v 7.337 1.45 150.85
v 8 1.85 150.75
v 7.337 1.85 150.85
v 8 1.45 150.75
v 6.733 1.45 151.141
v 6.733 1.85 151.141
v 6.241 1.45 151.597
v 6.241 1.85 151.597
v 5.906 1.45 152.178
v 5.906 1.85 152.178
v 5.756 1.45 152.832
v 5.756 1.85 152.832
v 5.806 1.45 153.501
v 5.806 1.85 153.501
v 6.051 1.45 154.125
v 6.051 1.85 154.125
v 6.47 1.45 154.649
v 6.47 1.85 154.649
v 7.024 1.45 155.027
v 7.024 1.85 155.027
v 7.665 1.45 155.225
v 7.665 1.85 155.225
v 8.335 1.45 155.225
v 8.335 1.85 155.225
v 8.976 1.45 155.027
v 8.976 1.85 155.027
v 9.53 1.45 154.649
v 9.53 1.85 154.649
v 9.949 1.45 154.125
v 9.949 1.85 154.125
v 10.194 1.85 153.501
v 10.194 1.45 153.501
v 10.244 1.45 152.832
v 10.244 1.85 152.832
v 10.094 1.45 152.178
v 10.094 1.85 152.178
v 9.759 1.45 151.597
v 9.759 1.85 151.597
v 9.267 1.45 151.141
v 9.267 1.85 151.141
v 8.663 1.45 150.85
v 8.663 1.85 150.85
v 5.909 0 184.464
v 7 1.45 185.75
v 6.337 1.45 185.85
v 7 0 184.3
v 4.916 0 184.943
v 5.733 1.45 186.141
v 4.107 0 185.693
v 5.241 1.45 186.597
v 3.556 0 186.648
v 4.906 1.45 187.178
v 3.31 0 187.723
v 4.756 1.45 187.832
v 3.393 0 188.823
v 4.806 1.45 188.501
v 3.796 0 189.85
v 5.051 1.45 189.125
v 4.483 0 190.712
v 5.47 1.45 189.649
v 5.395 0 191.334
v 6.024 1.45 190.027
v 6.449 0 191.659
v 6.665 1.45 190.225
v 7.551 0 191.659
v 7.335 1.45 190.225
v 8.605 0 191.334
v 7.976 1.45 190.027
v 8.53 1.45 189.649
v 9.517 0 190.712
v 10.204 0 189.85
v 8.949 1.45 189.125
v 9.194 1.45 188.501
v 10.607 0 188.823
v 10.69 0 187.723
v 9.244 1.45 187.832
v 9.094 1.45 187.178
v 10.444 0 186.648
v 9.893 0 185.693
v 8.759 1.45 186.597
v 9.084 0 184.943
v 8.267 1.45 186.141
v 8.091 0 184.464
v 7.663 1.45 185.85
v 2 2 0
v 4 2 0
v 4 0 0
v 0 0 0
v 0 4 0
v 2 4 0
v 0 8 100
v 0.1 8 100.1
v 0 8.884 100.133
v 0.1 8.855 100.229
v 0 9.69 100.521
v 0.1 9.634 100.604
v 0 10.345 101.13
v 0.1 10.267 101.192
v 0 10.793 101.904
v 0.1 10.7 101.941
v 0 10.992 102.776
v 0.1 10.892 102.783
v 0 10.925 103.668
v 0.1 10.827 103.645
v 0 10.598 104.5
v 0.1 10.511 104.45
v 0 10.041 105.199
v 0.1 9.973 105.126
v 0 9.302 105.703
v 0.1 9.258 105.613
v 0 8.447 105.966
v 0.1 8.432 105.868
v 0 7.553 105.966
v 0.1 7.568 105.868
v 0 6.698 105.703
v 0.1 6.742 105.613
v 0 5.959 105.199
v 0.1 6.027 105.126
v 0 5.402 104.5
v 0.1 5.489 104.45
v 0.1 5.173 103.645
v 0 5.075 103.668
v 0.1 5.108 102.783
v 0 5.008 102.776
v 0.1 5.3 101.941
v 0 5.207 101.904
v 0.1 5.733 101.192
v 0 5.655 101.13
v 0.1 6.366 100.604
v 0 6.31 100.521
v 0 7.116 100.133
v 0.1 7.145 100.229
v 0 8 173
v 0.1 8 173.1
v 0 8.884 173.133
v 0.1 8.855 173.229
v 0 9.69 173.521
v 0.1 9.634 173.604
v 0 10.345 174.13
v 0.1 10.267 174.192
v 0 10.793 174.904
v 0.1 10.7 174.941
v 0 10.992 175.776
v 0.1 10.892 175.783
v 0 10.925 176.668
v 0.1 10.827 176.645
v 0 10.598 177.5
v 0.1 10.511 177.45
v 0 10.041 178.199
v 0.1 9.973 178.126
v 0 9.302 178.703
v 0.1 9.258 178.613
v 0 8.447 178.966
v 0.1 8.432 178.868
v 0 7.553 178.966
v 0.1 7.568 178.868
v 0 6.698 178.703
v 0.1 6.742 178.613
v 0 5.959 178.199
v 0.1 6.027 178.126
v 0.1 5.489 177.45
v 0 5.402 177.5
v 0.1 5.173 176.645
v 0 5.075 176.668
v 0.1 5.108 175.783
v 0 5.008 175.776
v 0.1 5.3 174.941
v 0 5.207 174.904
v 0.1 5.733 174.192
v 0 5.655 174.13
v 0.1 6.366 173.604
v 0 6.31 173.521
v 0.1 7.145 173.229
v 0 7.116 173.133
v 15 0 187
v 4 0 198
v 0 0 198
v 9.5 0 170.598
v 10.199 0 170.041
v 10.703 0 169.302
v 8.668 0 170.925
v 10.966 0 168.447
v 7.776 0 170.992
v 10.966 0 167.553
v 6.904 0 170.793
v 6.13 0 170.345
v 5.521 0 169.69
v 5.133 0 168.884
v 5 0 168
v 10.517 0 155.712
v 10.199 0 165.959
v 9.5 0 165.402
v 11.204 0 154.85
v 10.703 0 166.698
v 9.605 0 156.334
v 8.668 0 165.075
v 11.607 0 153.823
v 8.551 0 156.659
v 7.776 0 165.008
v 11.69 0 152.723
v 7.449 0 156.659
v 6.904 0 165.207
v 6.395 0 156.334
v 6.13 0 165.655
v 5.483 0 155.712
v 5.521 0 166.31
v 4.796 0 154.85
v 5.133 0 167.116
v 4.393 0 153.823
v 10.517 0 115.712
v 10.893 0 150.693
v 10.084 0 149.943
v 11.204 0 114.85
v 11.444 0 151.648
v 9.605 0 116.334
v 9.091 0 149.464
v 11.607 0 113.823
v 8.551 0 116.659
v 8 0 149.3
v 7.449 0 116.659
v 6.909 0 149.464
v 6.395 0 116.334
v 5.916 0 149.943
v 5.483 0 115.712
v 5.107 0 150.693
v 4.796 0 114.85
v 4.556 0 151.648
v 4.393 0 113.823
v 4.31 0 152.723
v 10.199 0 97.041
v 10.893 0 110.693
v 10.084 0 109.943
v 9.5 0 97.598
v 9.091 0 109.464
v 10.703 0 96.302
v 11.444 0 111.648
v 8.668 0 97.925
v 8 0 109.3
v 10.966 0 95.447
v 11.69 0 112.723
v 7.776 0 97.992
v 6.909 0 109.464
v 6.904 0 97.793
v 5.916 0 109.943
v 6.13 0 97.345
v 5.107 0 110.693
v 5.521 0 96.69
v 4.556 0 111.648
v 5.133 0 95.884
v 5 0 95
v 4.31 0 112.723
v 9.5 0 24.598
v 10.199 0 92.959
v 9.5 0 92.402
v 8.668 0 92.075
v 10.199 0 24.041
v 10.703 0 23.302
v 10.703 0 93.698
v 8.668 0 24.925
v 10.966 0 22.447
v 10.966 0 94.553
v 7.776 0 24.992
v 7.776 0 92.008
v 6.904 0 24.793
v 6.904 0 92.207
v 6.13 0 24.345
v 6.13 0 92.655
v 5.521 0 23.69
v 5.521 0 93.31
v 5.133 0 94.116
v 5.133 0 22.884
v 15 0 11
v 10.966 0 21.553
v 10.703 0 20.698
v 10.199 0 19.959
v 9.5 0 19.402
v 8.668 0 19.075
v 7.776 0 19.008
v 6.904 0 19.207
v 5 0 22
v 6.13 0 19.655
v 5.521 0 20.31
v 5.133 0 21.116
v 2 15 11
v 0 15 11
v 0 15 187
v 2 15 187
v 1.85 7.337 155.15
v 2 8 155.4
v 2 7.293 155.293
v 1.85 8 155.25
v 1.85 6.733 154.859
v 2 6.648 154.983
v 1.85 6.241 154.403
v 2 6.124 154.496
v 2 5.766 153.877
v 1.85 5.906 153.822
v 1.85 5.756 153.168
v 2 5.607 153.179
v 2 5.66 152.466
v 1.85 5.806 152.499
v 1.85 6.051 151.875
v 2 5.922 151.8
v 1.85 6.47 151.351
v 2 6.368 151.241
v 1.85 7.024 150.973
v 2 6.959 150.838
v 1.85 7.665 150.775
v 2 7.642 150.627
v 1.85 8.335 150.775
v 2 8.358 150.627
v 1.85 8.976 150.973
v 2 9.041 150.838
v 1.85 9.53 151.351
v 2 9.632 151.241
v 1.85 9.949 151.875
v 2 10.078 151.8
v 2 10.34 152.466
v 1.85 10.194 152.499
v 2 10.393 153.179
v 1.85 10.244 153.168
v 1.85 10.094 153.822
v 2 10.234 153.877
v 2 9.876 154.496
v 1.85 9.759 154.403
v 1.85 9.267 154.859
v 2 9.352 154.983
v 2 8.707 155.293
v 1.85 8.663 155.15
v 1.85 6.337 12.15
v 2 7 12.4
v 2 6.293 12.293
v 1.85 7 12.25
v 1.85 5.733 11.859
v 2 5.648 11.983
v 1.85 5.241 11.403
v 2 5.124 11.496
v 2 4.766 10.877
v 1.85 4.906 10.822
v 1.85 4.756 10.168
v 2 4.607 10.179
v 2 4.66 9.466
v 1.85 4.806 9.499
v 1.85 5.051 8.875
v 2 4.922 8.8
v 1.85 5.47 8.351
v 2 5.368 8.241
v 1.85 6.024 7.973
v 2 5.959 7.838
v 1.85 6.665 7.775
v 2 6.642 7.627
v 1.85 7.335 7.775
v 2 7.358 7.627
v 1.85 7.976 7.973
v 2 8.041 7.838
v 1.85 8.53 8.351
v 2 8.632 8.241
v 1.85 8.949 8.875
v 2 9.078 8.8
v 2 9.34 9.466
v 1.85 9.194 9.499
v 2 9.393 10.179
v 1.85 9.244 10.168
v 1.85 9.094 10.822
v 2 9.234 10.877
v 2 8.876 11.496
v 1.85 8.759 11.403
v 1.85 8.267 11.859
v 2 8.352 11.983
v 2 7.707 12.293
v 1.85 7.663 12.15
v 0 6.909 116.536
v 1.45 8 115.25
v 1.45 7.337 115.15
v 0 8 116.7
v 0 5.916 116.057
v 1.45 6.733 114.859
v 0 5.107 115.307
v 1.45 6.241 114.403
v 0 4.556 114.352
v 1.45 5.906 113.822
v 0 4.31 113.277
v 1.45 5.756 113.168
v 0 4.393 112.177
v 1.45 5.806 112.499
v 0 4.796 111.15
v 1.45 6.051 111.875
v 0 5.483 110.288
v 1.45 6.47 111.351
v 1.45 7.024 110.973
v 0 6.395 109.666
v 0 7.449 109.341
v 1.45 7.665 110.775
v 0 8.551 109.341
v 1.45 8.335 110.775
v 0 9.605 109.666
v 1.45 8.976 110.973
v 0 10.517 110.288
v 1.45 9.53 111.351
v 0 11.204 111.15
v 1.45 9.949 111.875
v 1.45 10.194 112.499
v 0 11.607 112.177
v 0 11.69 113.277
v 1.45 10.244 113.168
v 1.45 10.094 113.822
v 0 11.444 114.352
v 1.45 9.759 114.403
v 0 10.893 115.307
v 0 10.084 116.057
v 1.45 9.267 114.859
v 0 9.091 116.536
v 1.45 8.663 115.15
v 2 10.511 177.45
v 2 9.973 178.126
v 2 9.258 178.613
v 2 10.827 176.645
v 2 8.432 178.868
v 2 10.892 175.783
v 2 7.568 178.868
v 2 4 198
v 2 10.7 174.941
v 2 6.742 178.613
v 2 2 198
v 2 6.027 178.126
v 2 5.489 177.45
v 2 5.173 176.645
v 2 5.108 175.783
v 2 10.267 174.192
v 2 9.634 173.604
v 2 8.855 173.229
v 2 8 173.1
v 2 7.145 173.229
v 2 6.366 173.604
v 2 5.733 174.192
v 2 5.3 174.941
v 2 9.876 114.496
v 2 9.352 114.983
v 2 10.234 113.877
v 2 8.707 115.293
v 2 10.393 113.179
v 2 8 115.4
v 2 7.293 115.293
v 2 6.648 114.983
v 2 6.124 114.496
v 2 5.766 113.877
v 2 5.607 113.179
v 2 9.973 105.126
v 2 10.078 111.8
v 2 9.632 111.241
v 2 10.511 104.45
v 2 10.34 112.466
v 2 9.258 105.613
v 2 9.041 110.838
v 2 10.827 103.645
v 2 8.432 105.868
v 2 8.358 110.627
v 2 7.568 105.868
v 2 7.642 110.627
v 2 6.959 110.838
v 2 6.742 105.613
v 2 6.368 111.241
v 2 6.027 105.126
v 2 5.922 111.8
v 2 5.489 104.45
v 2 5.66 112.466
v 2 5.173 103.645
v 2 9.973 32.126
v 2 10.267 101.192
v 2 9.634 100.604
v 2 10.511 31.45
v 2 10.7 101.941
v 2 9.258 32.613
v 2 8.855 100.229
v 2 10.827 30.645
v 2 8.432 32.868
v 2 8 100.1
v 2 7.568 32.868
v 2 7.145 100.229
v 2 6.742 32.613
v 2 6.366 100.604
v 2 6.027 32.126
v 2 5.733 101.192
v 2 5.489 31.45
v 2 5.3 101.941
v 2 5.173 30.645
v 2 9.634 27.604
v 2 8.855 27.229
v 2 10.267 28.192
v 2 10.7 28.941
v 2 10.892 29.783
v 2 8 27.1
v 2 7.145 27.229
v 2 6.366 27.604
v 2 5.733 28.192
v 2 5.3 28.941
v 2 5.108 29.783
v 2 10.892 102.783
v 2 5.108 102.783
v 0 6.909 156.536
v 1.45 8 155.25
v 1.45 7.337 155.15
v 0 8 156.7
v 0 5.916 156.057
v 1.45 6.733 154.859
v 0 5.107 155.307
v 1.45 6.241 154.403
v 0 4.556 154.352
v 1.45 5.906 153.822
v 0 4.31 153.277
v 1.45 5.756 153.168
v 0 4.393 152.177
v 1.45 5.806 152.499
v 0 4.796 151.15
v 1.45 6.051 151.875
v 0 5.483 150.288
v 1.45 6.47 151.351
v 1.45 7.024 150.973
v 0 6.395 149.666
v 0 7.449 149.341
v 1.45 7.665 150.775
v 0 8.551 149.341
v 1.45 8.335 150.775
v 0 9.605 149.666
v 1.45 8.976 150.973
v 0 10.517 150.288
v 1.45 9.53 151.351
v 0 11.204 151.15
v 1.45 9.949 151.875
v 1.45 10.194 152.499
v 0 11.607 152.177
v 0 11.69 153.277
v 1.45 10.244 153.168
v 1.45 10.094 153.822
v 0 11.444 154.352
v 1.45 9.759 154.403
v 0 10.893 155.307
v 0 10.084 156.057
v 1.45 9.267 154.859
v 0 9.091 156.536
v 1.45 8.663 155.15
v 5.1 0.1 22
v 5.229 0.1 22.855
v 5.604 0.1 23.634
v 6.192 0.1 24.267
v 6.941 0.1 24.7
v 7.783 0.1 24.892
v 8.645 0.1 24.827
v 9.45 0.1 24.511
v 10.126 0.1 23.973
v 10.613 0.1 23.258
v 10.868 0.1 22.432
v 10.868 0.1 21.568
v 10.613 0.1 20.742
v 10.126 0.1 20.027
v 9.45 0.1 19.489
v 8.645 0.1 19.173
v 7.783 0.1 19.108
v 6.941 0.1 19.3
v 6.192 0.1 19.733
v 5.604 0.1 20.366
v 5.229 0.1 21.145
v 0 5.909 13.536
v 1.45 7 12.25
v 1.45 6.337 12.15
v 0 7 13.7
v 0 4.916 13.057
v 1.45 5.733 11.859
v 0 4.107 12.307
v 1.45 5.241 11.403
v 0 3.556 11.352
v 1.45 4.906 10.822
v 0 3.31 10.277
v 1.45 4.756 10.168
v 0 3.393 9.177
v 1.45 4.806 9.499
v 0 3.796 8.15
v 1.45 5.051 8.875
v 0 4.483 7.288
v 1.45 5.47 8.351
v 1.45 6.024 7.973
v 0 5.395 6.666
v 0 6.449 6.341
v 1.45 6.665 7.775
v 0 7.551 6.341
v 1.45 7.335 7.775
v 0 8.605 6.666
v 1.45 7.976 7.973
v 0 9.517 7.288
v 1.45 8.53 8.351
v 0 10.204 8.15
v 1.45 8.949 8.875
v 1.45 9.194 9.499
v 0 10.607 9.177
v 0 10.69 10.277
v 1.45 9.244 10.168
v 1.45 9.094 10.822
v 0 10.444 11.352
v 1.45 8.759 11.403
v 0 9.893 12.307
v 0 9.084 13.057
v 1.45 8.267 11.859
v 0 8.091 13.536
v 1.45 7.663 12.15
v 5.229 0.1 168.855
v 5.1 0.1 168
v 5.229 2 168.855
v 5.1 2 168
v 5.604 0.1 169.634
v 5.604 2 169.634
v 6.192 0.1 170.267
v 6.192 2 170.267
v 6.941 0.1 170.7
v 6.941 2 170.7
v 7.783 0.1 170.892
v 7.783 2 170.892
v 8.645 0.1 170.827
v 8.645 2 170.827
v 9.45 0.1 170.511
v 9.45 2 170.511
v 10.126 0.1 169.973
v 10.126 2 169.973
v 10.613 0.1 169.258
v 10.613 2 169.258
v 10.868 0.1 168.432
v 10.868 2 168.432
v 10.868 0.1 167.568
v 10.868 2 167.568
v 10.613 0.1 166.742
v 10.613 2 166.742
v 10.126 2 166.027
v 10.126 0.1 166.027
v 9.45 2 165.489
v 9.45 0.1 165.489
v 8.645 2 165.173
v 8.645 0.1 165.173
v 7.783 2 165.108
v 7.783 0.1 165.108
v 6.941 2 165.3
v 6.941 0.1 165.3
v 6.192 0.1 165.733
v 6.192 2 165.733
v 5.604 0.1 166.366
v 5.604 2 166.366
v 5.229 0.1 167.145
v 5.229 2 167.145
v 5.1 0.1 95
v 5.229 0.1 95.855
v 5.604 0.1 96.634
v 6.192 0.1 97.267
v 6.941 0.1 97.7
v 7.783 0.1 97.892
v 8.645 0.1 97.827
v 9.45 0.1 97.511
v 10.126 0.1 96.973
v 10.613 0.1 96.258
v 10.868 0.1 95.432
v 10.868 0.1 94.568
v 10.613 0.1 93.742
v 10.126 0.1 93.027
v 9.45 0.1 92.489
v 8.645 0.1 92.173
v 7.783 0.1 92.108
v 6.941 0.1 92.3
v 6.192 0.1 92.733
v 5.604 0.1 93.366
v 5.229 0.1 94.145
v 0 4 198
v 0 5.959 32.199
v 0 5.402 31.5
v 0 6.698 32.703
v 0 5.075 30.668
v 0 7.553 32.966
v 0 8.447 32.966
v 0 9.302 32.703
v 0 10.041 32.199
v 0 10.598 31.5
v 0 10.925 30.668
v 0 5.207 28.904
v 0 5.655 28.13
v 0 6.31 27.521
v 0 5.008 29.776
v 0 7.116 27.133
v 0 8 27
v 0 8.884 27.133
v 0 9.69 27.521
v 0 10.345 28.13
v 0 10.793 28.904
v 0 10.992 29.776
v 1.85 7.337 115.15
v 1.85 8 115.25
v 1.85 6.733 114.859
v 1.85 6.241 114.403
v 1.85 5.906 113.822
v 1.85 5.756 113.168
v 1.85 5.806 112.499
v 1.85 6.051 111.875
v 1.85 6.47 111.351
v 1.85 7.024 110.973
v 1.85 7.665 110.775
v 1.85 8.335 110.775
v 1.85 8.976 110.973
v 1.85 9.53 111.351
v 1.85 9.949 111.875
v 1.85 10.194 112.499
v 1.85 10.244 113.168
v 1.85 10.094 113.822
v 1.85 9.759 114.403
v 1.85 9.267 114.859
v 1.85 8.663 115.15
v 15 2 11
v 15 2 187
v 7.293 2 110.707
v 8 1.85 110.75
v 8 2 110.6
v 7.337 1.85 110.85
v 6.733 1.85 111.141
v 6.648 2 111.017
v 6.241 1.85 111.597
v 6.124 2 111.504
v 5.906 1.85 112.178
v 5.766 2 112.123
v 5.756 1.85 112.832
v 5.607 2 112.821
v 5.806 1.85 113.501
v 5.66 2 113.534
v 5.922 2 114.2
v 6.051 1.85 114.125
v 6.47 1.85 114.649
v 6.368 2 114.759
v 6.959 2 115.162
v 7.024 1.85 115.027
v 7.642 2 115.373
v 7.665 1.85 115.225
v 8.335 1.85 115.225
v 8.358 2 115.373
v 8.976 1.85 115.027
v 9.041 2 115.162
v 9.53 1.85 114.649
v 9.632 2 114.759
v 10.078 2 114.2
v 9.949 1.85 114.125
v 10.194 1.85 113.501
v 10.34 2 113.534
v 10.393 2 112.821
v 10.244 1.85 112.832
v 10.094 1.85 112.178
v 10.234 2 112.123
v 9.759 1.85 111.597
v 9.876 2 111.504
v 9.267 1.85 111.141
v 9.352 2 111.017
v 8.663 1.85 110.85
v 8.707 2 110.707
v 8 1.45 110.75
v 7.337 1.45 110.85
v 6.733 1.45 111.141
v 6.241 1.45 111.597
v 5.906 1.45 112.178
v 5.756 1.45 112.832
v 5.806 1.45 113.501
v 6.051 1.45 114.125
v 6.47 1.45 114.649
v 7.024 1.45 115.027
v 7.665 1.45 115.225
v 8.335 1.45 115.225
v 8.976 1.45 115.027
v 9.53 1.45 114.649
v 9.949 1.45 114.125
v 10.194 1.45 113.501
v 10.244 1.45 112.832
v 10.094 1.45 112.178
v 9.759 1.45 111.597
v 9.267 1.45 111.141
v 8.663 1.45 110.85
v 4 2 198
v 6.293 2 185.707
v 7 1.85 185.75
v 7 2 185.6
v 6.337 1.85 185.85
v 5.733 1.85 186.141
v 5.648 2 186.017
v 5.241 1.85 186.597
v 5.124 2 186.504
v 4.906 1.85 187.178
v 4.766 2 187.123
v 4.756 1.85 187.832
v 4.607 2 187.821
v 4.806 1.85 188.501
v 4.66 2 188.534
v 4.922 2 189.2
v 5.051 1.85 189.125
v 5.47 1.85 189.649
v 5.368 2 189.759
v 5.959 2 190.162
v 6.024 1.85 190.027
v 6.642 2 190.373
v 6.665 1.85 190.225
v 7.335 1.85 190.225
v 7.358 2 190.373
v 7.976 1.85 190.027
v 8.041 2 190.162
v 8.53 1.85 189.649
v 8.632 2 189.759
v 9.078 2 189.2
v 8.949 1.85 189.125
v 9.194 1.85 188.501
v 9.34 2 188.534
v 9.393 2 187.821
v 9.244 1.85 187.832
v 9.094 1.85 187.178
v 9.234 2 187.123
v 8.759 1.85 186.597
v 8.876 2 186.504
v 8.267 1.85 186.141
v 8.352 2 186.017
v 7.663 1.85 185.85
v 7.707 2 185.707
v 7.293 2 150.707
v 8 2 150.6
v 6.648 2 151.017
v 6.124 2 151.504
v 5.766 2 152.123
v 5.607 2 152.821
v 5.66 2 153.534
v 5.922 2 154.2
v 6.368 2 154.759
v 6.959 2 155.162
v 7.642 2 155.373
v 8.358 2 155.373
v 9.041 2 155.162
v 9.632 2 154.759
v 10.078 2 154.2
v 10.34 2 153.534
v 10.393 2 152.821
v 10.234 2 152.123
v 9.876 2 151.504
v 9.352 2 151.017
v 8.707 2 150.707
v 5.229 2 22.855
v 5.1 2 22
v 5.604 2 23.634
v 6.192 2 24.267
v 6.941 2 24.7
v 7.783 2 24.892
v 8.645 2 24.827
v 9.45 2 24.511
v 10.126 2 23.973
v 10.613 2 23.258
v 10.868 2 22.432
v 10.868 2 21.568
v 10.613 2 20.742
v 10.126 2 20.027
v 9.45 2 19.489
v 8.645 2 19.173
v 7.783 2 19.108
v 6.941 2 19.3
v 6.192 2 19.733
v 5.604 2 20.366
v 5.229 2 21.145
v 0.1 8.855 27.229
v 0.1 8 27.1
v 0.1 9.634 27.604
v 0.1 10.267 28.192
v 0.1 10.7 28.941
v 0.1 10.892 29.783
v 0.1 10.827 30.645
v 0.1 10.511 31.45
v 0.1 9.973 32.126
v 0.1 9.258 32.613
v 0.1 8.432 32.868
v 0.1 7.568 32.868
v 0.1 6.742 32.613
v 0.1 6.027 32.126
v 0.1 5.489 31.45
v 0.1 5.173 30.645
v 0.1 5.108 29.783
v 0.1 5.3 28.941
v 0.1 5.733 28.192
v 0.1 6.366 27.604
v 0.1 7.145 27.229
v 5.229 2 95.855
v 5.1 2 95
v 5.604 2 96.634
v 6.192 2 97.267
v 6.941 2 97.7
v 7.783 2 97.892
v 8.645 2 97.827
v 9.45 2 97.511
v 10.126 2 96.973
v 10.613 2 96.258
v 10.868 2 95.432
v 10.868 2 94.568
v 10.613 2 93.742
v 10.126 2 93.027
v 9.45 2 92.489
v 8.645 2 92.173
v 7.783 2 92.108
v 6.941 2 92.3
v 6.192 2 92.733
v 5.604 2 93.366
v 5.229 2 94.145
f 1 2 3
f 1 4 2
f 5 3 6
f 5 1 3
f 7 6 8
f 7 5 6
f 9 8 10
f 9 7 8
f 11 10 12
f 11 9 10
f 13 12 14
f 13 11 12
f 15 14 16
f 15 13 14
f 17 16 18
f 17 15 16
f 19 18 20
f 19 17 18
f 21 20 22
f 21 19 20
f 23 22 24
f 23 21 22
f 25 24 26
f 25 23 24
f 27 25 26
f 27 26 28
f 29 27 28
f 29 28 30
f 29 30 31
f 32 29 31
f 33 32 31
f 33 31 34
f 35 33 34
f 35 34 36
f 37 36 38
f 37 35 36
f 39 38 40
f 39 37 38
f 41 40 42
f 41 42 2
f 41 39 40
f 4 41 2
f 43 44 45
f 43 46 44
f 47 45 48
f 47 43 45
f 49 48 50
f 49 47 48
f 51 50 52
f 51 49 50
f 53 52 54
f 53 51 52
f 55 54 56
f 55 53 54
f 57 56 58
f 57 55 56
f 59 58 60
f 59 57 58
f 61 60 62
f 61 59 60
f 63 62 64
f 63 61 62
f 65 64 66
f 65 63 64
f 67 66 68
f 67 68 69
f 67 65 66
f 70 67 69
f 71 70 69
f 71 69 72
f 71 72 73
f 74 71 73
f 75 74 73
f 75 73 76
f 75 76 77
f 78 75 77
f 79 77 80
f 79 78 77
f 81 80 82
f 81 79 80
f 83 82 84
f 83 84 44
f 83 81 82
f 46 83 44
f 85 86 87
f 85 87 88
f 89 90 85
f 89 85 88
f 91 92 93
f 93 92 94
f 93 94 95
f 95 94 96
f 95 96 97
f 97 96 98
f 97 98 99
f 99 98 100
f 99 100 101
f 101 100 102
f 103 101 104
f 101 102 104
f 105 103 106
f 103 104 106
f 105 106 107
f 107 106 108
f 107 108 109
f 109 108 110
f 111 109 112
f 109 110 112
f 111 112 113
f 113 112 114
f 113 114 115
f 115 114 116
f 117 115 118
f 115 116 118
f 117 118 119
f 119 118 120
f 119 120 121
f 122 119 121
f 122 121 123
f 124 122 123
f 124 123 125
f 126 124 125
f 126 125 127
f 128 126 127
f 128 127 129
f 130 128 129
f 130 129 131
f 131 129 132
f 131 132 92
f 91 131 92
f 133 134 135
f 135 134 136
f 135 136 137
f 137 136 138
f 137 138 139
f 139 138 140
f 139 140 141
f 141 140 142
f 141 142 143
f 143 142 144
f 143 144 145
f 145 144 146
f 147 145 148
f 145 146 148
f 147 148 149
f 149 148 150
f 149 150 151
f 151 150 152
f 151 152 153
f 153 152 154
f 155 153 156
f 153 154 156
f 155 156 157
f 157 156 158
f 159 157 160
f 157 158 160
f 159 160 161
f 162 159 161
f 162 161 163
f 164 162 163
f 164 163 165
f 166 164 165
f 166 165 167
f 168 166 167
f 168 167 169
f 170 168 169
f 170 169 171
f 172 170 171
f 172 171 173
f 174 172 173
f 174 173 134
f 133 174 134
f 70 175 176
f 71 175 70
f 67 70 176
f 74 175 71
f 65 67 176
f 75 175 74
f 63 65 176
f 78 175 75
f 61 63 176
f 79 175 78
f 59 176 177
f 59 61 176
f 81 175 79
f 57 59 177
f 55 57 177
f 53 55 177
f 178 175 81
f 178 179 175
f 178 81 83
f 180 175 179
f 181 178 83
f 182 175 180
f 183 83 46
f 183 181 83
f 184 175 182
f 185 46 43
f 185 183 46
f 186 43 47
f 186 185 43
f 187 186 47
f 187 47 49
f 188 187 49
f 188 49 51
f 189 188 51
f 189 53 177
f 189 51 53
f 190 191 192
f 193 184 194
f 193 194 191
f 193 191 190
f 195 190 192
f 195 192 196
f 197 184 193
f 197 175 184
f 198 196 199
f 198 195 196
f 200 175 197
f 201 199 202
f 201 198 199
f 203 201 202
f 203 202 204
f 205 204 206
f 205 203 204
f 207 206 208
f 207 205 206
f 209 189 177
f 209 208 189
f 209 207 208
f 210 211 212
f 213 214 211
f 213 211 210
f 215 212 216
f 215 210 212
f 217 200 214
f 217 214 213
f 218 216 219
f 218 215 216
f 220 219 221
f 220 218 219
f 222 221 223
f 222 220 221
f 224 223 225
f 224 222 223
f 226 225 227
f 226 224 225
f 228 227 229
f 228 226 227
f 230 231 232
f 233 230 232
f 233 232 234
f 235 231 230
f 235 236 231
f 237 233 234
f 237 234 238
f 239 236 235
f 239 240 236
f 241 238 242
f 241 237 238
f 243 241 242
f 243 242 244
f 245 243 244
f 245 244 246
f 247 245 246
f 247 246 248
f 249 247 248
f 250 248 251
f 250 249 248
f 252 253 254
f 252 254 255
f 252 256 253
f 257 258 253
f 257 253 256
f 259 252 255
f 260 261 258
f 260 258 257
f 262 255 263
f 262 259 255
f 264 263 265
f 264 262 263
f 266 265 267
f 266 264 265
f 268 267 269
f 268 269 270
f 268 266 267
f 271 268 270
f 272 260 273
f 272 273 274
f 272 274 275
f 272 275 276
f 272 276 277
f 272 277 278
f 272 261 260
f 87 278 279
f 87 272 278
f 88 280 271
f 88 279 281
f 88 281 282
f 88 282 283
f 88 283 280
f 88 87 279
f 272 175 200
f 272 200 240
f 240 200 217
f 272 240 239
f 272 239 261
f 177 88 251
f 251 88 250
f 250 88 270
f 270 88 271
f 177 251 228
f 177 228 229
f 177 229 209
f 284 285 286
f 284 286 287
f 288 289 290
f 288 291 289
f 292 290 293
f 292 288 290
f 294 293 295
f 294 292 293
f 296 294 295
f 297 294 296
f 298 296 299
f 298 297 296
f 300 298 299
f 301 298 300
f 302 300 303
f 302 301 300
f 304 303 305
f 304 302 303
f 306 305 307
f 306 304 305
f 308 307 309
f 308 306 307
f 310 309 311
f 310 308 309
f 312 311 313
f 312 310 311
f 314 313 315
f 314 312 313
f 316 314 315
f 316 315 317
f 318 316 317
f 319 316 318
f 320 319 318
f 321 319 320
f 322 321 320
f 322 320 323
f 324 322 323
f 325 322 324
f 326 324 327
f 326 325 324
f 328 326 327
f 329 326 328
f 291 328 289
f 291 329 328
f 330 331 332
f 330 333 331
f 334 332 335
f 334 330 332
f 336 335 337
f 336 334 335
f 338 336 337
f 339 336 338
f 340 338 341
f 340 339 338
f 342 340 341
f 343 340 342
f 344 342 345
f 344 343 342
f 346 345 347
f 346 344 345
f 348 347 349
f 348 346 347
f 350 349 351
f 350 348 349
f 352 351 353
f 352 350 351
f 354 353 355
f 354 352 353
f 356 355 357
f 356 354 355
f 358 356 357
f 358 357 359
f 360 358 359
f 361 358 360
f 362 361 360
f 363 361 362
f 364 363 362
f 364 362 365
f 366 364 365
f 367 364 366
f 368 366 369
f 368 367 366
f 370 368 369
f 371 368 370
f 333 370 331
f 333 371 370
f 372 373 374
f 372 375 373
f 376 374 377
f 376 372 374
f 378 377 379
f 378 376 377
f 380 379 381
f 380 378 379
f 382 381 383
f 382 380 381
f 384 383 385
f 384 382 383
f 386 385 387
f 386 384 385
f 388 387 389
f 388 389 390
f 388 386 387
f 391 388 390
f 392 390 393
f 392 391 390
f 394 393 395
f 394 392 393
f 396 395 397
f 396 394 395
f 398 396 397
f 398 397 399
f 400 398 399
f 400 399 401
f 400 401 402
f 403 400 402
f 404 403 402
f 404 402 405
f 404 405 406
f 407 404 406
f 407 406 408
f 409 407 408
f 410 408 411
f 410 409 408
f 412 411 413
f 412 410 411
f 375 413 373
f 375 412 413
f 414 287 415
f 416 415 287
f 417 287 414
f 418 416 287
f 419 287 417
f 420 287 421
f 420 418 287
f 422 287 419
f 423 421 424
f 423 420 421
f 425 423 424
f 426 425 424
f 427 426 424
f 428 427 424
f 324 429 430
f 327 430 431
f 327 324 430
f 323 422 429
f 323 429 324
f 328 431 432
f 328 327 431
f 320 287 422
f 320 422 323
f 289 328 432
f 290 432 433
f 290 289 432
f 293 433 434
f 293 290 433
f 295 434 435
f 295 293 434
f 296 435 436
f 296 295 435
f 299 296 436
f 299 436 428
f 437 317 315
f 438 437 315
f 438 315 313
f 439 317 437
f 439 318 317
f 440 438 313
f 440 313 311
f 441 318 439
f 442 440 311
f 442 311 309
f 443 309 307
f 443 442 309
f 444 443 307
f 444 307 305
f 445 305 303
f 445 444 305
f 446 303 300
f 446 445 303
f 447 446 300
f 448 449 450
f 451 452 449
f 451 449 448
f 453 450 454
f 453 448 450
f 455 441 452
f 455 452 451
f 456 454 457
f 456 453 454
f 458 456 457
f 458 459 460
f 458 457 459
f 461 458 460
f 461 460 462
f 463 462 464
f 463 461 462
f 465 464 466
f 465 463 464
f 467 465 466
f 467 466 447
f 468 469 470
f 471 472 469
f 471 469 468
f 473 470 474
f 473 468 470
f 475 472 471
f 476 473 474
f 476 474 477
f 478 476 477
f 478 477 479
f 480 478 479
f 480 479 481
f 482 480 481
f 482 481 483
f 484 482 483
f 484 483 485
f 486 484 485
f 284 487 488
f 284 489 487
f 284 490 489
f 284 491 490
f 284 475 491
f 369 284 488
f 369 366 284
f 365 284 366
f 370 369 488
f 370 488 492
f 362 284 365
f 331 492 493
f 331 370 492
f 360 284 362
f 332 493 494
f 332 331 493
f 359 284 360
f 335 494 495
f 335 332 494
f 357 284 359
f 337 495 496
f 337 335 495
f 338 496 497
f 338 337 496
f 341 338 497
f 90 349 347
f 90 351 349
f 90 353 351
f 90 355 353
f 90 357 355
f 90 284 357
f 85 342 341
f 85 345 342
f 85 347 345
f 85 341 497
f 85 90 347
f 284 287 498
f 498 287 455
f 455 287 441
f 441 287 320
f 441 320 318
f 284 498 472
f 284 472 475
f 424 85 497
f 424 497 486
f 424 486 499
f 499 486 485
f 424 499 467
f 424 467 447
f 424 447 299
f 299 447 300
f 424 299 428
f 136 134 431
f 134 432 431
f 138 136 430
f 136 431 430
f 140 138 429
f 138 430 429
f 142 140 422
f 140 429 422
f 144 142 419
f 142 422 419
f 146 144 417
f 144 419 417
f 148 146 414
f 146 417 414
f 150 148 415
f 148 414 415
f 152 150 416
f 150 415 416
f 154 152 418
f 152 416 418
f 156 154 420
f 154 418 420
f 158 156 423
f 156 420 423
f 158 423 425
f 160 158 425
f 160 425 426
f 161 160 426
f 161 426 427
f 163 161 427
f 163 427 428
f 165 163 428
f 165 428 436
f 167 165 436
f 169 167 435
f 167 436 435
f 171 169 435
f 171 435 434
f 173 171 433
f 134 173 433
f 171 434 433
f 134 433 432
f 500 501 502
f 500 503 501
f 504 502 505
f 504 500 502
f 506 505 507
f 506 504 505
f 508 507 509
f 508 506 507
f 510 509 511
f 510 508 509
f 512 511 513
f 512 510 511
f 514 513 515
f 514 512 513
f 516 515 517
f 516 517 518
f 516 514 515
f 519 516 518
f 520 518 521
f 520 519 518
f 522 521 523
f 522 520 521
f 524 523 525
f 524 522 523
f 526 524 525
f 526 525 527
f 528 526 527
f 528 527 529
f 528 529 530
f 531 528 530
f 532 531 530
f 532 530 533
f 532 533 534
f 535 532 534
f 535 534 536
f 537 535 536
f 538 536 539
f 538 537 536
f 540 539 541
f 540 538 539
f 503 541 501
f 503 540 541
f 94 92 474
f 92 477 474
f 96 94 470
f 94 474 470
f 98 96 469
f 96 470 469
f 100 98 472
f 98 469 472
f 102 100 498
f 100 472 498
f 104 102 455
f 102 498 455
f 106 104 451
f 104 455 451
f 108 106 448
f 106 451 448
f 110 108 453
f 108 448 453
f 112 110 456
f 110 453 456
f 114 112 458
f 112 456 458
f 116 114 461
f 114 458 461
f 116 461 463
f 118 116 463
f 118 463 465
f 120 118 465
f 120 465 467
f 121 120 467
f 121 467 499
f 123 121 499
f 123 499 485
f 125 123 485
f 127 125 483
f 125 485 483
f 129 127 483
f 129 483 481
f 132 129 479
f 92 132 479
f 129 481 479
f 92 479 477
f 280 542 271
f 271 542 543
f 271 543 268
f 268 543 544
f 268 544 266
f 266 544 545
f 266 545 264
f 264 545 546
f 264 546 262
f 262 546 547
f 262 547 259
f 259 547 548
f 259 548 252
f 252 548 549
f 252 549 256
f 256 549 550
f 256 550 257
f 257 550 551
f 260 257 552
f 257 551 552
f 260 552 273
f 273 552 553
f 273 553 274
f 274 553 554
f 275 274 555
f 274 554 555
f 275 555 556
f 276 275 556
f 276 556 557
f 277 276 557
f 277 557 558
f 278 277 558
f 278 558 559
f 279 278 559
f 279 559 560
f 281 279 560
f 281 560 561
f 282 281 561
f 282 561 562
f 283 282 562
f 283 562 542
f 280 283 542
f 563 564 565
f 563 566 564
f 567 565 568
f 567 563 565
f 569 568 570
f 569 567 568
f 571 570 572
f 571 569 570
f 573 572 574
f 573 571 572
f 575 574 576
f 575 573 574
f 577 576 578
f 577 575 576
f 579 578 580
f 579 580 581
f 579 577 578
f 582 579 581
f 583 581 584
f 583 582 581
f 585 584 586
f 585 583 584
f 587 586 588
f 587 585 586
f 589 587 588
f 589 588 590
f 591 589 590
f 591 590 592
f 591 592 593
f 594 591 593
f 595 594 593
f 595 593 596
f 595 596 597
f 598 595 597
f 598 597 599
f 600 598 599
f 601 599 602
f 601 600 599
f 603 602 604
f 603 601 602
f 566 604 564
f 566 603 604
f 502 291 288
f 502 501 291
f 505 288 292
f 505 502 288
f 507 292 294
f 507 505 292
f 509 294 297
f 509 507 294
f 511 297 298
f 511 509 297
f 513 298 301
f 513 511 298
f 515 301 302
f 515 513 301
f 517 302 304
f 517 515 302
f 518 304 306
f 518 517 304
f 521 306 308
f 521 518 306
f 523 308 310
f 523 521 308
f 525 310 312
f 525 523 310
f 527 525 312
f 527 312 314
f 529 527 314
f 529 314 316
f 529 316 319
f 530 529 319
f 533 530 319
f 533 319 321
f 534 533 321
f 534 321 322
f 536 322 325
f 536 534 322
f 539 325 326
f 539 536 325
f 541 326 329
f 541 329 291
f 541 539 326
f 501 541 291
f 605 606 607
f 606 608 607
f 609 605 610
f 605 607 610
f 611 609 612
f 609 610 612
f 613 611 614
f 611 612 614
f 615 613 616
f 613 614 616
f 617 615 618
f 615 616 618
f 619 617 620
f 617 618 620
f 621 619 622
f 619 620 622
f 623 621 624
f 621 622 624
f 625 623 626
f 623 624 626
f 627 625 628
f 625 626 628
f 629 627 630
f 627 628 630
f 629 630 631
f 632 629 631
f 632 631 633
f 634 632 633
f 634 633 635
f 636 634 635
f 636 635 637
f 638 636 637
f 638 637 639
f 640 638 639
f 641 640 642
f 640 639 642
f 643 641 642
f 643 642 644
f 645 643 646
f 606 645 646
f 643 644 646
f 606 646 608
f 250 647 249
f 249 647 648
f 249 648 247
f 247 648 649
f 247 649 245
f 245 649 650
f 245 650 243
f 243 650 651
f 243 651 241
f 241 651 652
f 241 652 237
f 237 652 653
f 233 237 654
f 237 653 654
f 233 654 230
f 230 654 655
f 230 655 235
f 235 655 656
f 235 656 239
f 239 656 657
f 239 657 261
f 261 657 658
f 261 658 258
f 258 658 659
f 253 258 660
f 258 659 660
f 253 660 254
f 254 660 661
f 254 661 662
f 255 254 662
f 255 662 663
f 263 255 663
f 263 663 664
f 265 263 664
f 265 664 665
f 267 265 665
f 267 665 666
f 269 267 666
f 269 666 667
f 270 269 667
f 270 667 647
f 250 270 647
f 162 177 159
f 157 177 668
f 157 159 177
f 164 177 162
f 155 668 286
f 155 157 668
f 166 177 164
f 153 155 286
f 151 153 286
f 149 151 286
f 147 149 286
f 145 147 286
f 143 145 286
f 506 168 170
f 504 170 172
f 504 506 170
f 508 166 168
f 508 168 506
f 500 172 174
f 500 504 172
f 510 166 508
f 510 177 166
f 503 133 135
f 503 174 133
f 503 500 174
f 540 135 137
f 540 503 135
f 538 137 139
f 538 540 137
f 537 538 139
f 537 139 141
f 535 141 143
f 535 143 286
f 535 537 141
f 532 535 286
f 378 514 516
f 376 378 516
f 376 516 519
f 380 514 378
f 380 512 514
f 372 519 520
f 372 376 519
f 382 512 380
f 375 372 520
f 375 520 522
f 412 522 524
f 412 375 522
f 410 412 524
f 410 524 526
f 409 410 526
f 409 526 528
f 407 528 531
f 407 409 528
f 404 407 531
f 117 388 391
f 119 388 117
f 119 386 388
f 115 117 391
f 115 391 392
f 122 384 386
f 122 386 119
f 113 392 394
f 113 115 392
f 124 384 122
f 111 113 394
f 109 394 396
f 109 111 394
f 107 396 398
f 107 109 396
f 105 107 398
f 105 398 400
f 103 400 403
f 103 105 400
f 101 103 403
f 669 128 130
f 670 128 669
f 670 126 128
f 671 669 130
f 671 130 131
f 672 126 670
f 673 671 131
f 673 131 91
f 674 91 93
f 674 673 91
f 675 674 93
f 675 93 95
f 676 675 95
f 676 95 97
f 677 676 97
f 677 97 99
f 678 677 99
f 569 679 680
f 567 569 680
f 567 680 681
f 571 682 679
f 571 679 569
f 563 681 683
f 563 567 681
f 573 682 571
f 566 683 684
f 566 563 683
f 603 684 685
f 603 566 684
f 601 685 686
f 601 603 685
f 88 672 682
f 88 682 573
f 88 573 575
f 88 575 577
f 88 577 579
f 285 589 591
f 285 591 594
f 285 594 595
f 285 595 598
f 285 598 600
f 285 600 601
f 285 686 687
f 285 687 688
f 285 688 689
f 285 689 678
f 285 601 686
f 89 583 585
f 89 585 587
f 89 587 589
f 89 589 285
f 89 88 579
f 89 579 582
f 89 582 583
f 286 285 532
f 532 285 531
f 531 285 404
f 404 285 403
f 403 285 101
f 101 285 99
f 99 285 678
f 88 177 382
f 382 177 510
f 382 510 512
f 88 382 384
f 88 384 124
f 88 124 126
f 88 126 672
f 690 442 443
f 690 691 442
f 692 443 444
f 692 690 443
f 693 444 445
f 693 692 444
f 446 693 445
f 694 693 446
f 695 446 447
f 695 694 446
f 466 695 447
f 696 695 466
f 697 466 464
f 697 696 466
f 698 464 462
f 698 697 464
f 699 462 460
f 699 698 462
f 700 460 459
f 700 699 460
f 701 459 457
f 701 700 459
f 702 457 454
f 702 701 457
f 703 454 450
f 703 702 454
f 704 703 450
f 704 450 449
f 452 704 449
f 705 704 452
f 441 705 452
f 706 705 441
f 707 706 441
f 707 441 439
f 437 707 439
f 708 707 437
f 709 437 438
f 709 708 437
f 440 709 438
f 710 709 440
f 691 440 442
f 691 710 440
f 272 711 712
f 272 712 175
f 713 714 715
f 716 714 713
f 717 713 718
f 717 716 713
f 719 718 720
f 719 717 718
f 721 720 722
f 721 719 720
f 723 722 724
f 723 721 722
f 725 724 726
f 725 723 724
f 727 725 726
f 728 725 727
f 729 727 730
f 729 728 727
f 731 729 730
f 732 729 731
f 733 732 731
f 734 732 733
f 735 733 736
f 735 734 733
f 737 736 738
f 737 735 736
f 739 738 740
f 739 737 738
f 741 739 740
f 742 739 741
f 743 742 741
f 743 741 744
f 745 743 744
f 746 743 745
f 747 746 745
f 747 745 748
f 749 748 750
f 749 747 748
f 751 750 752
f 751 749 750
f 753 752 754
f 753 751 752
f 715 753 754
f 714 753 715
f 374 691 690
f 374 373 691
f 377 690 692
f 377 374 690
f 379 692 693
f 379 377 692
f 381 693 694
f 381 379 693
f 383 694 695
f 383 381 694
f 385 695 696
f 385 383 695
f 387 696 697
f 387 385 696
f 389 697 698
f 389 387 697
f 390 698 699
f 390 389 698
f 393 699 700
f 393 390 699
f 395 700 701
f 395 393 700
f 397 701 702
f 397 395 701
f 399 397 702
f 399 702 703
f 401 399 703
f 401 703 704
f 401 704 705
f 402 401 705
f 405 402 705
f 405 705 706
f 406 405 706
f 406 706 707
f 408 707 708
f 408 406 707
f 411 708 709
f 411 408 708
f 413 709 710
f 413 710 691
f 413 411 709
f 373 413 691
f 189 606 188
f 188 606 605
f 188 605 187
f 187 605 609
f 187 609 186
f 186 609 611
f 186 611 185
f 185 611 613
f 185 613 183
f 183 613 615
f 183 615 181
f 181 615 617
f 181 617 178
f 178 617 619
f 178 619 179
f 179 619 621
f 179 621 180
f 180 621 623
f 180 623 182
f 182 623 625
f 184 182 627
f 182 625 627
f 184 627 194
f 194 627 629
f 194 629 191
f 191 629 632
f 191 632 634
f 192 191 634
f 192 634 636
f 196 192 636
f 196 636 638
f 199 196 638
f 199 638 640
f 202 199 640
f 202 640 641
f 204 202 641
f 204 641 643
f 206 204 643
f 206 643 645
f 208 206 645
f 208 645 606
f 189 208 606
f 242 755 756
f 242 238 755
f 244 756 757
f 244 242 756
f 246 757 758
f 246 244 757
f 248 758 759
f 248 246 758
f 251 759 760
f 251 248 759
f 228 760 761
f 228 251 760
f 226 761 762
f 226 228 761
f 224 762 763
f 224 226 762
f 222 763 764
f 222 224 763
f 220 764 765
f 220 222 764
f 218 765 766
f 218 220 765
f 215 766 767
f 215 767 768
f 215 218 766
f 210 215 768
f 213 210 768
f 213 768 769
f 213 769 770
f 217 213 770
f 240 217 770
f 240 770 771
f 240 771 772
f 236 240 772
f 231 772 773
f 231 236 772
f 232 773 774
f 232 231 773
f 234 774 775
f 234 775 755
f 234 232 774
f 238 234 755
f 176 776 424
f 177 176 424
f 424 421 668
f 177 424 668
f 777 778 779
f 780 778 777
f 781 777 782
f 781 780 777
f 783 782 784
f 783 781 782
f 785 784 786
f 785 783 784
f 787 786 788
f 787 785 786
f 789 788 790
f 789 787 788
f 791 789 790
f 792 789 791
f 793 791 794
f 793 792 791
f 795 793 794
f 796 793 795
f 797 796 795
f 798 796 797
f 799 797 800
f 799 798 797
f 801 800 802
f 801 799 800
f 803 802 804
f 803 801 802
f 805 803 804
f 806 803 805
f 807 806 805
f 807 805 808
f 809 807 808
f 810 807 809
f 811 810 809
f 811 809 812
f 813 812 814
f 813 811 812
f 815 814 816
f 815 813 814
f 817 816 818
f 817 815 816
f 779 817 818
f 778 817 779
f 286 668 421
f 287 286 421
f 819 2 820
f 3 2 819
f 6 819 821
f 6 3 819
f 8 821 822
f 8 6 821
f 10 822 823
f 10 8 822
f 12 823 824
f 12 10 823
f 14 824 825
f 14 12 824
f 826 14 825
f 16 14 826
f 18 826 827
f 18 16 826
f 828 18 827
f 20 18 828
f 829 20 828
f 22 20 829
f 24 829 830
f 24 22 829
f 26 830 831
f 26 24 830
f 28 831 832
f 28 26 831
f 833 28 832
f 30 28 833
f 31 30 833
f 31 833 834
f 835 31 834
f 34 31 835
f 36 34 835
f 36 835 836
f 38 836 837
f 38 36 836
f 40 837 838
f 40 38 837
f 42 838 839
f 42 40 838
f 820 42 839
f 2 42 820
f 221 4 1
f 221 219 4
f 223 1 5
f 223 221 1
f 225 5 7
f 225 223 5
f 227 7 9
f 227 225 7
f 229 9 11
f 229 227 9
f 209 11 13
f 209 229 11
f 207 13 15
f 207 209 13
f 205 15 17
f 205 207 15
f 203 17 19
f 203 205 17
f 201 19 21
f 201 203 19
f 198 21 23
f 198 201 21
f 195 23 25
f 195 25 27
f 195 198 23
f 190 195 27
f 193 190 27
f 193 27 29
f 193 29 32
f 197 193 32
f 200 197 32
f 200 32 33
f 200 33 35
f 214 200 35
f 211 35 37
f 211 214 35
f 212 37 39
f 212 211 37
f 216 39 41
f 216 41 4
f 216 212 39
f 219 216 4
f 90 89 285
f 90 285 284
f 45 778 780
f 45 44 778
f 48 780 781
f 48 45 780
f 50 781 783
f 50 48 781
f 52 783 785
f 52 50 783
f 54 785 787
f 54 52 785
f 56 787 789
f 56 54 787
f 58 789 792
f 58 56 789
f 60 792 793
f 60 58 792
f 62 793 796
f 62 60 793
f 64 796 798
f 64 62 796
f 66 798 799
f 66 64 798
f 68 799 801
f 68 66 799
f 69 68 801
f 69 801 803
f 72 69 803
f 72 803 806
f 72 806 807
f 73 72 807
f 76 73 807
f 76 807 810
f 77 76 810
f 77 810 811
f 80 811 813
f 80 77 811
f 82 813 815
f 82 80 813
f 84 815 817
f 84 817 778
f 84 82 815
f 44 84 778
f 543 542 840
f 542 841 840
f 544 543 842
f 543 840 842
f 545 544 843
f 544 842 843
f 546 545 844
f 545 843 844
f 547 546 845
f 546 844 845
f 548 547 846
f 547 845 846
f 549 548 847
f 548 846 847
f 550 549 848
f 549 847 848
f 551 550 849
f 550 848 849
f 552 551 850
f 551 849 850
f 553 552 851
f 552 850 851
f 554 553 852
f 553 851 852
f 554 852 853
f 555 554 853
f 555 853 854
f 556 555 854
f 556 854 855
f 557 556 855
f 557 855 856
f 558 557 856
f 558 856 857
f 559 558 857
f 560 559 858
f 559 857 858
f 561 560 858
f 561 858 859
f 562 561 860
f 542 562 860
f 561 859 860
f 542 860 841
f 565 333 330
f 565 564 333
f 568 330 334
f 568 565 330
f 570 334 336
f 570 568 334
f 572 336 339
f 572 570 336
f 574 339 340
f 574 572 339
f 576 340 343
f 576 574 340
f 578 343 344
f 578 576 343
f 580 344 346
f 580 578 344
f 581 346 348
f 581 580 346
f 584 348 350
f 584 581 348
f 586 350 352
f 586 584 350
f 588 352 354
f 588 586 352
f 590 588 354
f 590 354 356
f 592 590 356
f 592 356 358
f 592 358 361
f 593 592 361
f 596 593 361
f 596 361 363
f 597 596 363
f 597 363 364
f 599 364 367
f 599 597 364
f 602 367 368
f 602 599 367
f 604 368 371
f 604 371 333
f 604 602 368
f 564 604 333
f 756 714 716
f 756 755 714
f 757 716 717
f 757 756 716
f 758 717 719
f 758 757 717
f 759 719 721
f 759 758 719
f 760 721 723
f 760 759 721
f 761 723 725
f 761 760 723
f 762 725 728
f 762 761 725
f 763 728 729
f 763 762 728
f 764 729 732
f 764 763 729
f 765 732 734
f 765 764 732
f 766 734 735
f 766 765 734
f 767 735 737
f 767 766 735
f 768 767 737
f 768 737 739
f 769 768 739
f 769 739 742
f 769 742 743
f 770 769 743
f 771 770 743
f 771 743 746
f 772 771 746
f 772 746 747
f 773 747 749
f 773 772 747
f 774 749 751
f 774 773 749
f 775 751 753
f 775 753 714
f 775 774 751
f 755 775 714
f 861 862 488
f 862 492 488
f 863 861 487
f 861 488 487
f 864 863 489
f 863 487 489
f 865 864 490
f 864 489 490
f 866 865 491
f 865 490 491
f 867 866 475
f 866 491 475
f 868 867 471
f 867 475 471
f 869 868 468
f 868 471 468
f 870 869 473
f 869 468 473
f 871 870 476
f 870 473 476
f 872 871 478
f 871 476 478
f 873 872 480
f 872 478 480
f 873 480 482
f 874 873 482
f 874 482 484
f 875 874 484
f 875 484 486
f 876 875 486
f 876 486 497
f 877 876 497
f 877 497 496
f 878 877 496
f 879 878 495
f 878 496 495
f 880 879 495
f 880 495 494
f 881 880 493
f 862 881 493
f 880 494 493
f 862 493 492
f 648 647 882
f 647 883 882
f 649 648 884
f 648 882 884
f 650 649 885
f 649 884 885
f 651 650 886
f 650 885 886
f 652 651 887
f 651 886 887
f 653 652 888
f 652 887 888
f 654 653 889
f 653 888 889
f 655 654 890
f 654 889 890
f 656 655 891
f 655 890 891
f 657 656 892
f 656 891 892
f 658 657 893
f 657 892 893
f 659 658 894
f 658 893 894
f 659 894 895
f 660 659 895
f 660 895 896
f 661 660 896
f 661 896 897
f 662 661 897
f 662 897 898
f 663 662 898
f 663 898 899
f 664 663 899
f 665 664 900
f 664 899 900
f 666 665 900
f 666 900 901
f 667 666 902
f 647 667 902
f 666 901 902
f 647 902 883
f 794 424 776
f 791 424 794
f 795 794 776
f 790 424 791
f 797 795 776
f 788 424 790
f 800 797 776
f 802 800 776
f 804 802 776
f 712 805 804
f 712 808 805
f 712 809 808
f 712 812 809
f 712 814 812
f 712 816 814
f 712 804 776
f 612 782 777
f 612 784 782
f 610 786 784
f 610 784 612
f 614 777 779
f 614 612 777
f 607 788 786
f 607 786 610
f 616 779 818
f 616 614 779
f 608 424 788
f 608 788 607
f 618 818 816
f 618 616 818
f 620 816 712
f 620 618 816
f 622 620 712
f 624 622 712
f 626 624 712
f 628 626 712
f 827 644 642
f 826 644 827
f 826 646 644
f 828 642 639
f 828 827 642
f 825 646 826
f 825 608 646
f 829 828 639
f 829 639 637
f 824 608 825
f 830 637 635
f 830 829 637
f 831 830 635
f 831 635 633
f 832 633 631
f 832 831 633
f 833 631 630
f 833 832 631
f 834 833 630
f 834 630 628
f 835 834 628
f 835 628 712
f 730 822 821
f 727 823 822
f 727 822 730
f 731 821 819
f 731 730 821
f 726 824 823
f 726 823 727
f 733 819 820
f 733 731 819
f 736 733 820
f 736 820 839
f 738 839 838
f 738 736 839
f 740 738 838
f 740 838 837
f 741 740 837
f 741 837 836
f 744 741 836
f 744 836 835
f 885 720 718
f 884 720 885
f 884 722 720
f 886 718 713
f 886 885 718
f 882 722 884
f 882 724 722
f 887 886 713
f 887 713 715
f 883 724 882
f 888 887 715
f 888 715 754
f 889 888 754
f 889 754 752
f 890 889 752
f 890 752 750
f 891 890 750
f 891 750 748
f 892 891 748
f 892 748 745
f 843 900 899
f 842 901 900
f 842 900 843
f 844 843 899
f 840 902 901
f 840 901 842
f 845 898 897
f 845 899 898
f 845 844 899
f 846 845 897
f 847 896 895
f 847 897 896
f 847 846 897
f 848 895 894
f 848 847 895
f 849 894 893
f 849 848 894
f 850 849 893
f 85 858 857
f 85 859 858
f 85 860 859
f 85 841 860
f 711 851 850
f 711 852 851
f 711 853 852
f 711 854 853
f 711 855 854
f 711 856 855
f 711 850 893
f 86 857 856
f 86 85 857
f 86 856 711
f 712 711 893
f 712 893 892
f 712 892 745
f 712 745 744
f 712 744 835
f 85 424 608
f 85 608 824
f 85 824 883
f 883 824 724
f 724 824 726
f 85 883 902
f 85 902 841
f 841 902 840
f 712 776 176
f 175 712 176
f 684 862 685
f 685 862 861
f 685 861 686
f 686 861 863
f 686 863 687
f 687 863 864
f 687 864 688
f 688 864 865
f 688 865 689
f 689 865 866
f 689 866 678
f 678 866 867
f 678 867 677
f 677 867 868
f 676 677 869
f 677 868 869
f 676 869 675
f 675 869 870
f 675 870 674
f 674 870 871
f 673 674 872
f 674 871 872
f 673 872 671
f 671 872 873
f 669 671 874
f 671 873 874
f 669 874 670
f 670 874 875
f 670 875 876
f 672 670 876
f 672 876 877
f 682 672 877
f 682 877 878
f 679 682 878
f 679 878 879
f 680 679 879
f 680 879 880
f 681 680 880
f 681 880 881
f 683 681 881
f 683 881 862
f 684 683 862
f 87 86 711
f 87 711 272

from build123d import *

# Parameters (mm, degrees)
EXTRUDE_1_DEPTH             = 198
CHAMFER_1_SIZE              = 11
HOLE_WIZARD_M41_AT_2_COUNT  = 2
HOLE_WIZARD_M41_AT_2_PITCH  = 35.0142828
HOLE_WIZARD_M41_AT_3_COUNT  = 2
HOLE_WIZARD_M41_AT_3_PITCH  = 75.00666637
HOLE_WIZARD_M42_AT_2_COUNT  = 2
HOLE_WIZARD_M42_AT_2_PITCH  = 103.004854255
HOLE_WIZARD_M42_AT_3_COUNT  = 2
HOLE_WIZARD_M42_AT_3_PITCH  = 143.003496461
HOLE_WIZARD_M51_D           = 5.8
HOLE_WIZARD_M51_DEPTH       = 3
HOLE_WIZARD_M51_CSINK_D     = 6
HOLE_WIZARD_M51_CSINK_ANGLE = 90
HOLE_WIZARD_M51_TIP         = 1.742495795
HOLE_WIZARD_M52_D           = 5.8
HOLE_WIZARD_M52_DEPTH       = 3
HOLE_WIZARD_M52_CSINK_D     = 6
HOLE_WIZARD_M52_CSINK_ANGLE = 90
HOLE_WIZARD_M52_TIP         = 1.742495795


with BuildPart() as part:
    # Эскиз1 → Бобышка-Вытянуть1 (new body)
    with BuildSketch(Plane.XY):
        Polygon((0, 0), (0, 15), (2, 15), (2, 2), (15, 2), (15, 0), align=None)
    extrude(amount=EXTRUDE_1_DEPTH)

    # Фаска1
    chamfer_1_edges = [part.edges().sort_by_distance(p)[0] for p in [
        (1, 15, 198),
        (1, 15, 0),
        (15, 1, 198),
        (15, 1, 0),
    ]]
    chamfer(chamfer_1_edges, length=CHAMFER_1_SIZE)

    # Эскиз2 → Зенковка для винта с потайной головкой M41 (revolve, cut)
    with BuildSketch(Plane(origin=(7, 0, 188), x_dir=(0, 0, -1), z_dir=(1, 0, 0))):
        Polygon((0, 0), (0, 2), (2.4, 2), (2.25, 1.85), (2.25, 1.45), (3.7, 0), align=None)
    hole_wizard_m41 = revolve(axis=Axis((7, -6.35, 188), (0, 1, 0)), mode=Mode.SUBTRACT)

    # Зенковка для винта с потайной головкой M41 at 2: Зенковка для винта с потайной головкой M41 ×2
    with Locations(*[Vector(0.028559774, 0, -0.999592086) * (i * HOLE_WIZARD_M41_AT_2_PITCH) for i in range(1, HOLE_WIZARD_M41_AT_2_COUNT)]):
        add(hole_wizard_m41, mode=Mode.SUBTRACT)

    # Зенковка для винта с потайной головкой M41 at 3: Зенковка для винта с потайной головкой M41 ×2
    with Locations(*[Vector(0.013332148, 0, -0.999911123) * (i * HOLE_WIZARD_M41_AT_3_PITCH) for i in range(1, HOLE_WIZARD_M41_AT_3_COUNT)]):
        add(hole_wizard_m41, mode=Mode.SUBTRACT)

    # Эскиз4 → Зенковка для винта с потайной головкой M42 (revolve, cut)
    with BuildSketch(Plane(origin=(0, 7, 10), x_dir=(0, 0, 1), z_dir=(0, 1, 0))):
        Polygon((0, 0), (0, 2), (2.4, 2), (2.25, 1.85), (2.25, 1.45), (3.7, 0), align=None)
    hole_wizard_m42 = revolve(axis=Axis((-6.35, 7, 10), (1, 0, 0)), mode=Mode.SUBTRACT)

    # Зенковка для винта с потайной головкой M42 at 2: Зенковка для винта с потайной головкой M42 ×2
    with Locations(*[Vector(0, 0.00970828, 0.999952874) * (i * HOLE_WIZARD_M42_AT_2_PITCH) for i in range(1, HOLE_WIZARD_M42_AT_2_COUNT)]):
        add(hole_wizard_m42, mode=Mode.SUBTRACT)

    # Зенковка для винта с потайной головкой M42 at 3: Зенковка для винта с потайной головкой M42 ×2
    with Locations(*[Vector(0, 0.006992836, 0.99997555) * (i * HOLE_WIZARD_M42_AT_3_PITCH) for i in range(1, HOLE_WIZARD_M42_AT_3_COUNT)]):
        add(hole_wizard_m42, mode=Mode.SUBTRACT)

    # Отверстие с зазором M51
    with Locations(Plane.ZY):
        with Locations((103, 8), (30, 8), (176, 8)):
            CounterSinkHole(HOLE_WIZARD_M51_D / 2, HOLE_WIZARD_M51_CSINK_D / 2, depth=HOLE_WIZARD_M51_DEPTH, counter_sink_angle=HOLE_WIZARD_M51_CSINK_ANGLE)
            with Locations((0, 0, -(HOLE_WIZARD_M51_DEPTH + HOLE_WIZARD_M51_TIP / 2))):  # 118° drill point
                Cone(0, HOLE_WIZARD_M51_D / 2, HOLE_WIZARD_M51_TIP, mode=Mode.SUBTRACT)

    # Отверстие с зазором M52
    with Locations(Plane.XZ):
        with Locations((8, 95), (8, 22), (8, 168)):
            CounterSinkHole(HOLE_WIZARD_M52_D / 2, HOLE_WIZARD_M52_CSINK_D / 2, depth=HOLE_WIZARD_M52_DEPTH, counter_sink_angle=HOLE_WIZARD_M52_CSINK_ANGLE)
            with Locations((0, 0, -(HOLE_WIZARD_M52_DEPTH + HOLE_WIZARD_M52_TIP / 2))):  # 118° drill point
                Cone(0, HOLE_WIZARD_M52_D / 2, HOLE_WIZARD_M52_TIP, mode=Mode.SUBTRACT)


solid = part.part
